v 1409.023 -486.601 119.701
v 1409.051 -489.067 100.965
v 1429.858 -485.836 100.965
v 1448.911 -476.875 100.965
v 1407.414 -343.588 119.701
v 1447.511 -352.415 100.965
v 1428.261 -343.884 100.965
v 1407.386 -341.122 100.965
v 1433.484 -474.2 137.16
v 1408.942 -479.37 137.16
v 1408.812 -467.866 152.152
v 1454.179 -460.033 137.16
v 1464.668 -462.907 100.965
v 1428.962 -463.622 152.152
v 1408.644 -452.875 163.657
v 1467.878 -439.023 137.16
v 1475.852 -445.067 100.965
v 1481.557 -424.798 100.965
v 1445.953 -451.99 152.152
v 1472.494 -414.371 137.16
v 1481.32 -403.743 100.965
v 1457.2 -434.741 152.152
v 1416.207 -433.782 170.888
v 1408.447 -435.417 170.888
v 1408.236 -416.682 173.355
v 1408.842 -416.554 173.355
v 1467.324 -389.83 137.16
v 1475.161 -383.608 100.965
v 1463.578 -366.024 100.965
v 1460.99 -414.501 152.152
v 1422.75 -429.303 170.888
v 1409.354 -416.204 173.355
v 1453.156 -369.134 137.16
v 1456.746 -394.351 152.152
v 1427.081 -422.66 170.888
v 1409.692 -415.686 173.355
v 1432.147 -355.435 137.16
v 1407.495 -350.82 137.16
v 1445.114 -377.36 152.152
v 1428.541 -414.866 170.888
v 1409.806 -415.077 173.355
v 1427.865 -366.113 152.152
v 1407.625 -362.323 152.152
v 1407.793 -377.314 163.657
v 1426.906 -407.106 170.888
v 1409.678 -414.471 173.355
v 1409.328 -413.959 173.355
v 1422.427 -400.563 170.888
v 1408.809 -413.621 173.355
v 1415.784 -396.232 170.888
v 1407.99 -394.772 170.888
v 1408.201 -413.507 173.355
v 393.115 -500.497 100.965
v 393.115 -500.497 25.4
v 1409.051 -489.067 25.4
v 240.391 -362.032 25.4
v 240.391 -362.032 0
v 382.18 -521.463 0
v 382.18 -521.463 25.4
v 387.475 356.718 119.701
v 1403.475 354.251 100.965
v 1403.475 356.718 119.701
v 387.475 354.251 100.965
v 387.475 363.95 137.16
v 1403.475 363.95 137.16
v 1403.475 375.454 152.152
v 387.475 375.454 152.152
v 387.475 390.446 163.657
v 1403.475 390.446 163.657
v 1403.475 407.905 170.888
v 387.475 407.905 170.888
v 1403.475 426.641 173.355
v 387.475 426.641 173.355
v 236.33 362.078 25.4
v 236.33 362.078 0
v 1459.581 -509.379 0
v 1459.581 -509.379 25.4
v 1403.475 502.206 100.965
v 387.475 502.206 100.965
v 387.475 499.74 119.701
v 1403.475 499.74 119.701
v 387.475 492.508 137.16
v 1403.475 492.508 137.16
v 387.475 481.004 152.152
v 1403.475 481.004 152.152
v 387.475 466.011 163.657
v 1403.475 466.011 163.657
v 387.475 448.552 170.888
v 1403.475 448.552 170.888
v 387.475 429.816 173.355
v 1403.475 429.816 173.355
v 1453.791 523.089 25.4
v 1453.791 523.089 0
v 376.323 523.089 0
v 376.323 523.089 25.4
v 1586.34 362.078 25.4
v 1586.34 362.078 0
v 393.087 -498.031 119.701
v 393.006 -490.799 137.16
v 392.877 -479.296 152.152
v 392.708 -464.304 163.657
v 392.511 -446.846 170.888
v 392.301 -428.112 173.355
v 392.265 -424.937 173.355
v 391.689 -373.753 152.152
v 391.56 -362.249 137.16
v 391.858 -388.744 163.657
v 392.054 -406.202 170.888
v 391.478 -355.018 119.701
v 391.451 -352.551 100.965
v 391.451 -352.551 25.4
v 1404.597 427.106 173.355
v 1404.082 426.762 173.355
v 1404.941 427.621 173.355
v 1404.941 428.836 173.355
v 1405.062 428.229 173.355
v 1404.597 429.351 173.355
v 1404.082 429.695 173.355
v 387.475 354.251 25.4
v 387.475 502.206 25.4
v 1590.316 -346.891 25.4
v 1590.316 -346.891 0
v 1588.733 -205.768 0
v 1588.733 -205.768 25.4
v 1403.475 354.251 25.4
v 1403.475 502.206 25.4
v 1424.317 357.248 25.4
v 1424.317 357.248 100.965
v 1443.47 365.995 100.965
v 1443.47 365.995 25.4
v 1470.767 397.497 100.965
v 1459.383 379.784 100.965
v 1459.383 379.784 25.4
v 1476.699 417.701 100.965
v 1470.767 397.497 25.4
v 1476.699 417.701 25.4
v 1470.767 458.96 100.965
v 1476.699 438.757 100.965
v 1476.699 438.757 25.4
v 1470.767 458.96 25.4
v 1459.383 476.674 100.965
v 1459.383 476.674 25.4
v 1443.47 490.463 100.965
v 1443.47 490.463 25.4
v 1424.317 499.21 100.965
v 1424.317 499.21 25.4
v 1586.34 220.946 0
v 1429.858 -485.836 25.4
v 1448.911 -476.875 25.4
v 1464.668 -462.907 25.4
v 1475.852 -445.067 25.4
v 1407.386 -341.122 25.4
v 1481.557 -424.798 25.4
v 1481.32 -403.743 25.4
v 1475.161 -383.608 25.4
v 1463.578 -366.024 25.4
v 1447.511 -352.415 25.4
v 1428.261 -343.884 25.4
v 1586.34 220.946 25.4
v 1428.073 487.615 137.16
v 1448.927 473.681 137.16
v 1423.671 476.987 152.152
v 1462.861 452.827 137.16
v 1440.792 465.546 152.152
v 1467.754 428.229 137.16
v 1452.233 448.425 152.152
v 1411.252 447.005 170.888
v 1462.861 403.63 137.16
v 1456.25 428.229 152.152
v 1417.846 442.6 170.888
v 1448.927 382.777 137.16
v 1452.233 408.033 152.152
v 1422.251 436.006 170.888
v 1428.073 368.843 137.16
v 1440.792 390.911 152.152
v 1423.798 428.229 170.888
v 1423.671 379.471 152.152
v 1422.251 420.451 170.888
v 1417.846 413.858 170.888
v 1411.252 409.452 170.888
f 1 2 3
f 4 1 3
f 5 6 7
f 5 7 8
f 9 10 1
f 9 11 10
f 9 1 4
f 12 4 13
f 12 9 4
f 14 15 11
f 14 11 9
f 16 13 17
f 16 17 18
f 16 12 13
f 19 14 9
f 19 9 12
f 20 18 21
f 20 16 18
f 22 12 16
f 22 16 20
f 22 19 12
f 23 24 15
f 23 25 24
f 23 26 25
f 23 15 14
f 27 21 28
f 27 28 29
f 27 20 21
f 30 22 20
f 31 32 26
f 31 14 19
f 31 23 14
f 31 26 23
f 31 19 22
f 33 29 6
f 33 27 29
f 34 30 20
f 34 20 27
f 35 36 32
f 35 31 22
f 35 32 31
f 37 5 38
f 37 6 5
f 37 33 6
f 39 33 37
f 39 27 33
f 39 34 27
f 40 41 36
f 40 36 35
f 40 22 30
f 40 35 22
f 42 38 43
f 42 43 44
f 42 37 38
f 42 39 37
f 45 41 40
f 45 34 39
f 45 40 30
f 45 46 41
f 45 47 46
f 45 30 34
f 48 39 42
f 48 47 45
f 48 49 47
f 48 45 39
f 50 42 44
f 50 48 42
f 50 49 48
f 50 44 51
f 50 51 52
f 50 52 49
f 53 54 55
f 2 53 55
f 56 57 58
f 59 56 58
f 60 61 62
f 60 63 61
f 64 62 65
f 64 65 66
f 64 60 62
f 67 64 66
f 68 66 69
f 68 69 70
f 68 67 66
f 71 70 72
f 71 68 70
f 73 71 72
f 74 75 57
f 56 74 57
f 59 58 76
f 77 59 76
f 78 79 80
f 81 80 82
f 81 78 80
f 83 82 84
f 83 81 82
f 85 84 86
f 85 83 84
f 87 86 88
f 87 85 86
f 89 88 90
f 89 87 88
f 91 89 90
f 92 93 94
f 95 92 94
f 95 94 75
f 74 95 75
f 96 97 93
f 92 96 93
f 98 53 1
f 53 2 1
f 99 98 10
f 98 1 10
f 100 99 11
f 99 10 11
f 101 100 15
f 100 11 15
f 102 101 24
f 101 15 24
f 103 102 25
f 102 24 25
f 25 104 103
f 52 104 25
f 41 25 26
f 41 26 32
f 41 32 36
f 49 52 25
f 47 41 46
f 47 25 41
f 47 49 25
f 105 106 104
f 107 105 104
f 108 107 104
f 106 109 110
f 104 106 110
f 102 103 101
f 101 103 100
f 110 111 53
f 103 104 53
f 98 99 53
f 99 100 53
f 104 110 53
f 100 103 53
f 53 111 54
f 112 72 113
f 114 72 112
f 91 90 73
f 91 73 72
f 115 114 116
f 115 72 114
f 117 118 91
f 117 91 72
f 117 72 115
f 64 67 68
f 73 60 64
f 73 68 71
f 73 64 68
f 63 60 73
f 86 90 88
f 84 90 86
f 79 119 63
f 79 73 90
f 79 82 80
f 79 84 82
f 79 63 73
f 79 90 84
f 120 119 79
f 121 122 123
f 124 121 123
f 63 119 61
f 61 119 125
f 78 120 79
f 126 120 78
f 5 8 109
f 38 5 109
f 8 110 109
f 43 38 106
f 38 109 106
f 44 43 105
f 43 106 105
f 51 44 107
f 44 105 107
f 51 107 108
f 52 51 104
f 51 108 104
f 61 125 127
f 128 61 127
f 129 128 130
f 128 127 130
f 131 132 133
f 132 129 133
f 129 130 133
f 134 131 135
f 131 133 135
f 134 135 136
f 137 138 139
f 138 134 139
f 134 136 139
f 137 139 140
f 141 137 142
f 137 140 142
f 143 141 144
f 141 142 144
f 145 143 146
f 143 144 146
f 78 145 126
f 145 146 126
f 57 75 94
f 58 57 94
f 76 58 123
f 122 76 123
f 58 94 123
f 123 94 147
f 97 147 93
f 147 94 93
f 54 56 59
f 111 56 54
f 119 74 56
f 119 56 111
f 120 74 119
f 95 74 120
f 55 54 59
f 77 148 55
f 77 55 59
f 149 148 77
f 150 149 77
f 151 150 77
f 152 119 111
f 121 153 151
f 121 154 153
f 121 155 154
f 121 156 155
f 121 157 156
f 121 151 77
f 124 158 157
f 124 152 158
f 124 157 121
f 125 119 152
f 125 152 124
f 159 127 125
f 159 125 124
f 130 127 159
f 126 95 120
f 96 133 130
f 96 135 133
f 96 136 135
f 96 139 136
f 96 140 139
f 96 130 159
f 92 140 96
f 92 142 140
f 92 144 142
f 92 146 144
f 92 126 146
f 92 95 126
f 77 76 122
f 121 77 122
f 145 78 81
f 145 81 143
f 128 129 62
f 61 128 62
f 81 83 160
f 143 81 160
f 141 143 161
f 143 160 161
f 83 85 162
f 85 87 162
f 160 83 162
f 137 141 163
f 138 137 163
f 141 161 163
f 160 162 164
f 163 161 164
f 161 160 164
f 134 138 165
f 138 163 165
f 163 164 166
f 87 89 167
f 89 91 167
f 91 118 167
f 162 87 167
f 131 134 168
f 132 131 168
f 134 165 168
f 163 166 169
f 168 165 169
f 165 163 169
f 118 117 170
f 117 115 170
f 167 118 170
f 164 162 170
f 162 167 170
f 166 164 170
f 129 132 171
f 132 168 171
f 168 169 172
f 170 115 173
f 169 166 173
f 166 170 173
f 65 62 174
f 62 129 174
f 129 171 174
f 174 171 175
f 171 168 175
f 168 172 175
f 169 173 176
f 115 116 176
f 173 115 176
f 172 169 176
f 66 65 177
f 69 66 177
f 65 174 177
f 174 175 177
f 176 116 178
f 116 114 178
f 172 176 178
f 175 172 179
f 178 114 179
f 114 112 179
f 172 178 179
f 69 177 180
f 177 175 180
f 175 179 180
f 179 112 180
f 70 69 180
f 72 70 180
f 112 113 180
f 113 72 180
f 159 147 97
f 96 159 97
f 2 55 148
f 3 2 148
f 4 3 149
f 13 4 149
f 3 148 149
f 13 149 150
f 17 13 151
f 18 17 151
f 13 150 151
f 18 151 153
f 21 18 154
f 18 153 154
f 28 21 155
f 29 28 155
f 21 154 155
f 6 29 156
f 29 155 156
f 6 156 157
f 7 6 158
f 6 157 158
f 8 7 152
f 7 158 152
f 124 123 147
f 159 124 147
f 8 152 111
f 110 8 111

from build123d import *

# Parameters (mm, degrees)
F2_DEPTH = 25.4
F3_W     = 1016
F3_H     = 147.955
F4_DEPTH = 147.955
F5_DEPTH = 133.5532
F6_R     = 72.39
F7_R     = 72.39


# Not quite as in the source:
# - a feature names something its author has since deleted; it is built from what else it names


with BuildPart() as f2:
    # F1 (on face) → F2 (new body)
    with BuildSketch(Plane.XY):
        Polygon((319.0343479268, 457.2), (236.3300025423, 362.0783686638), (240.3907269744, -362.0321180929), (325.0280779844, -457.2), (1501.5633212704, -457.2), (1590.3160302528, -346.8912047778), (1588.7331709988, -205.7675014721), (1587.5366926193, 7.5891437009), (1586.3402142398, 220.9457888739), (1586.3402142398, 362.0783686638), (1508.033296253, 457.2), align=None)
        Polygon((376.3225418129, 523.0894817851), (319.0343479268, 457.2), (1508.033296253, 457.2), (1453.79114151, 523.0894817851), align=None)
        Polygon((1501.5633212704, -457.2), (325.0280779844, -457.2), (382.1802665493, -521.4630312406), (1459.5810992365, -509.3787828947), align=None)
    extrude(amount=F2_DEPTH)

    # F3 (on face) → F4 (join)
    with BuildSketch(Plane.XY.offset(25.4)):
        with Locations((895.4748051167, 428.2288251305)):
            Rectangle(F3_W, F3_H)
        with BuildLine():
            Line((1403.4748051167, 502.2063251305), (1403.4748051167, 354.2513251305))
            ThreePointArc((1403.4748051167, 354.2513251305), (1477.4523051167, 428.2288251305), (1403.4748051167, 502.2063251305))
        make_face()
        Polygon((391.4505850052, -352.5514191944), (393.1150321411, -500.4970566453), (1409.0507399579, -489.0673767425), (1407.3862928221, -341.1217392917), align=None)
        with BuildLine():
            Line((1407.3862928221, -341.1217392917), (1409.0507399579, -489.0673767425))
            ThreePointArc((1409.0507399579, -489.0673767425), (1482.1913351154, -414.2623344491), (1407.3862928221, -341.1217392917))
        make_face()
    extrude(amount=F4_DEPTH)

    # F3 (on face) → F5 (join)
    with BuildSketch(Plane.XY.offset(25.4)):
        with Locations((895.4748051167, 428.2288251305)):
            Rectangle(F3_W, F3_H)
        with BuildLine():
            Line((1403.4748051167, 502.2063251305), (1403.4748051167, 354.2513251305))
            ThreePointArc((1403.4748051167, 354.2513251305), (1477.4523051167, 428.2288251305), (1403.4748051167, 502.2063251305))
        make_face()
        Polygon((391.4505850052, -352.5514191944), (393.1150321411, -500.4970566453), (1409.0507399579, -489.0673767425), (1407.3862928221, -341.1217392917), align=None)
        with BuildLine():
            Line((1407.3862928221, -341.1217392917), (1409.0507399579, -489.0673767425))
            ThreePointArc((1409.0507399579, -489.0673767425), (1482.1913351154, -414.2623344491), (1407.3862928221, -341.1217392917))
        make_face()
    extrude(amount=F5_DEPTH)

    # F6
    f6_edges = [f2.edges().sort_by_distance(p)[0] for p in [
        (895.474805, 502.206325, 173.355),
        (1477.452305, 428.228825, 173.355),
        (895.474805, 354.251325, 173.355),
    ]]
    fillet(f6_edges, radius=F6_R)

    # F7
    f7_edges = [f2.edges().sort_by_distance(p)[0] for p in [
        (899.418439, -346.836579, 173.355),
        (1482.191335, -414.262334, 173.355),
        (901.082886, -494.782217, 173.355),
    ]]
    fillet(f7_edges, radius=F7_R)


solid = f2.part
